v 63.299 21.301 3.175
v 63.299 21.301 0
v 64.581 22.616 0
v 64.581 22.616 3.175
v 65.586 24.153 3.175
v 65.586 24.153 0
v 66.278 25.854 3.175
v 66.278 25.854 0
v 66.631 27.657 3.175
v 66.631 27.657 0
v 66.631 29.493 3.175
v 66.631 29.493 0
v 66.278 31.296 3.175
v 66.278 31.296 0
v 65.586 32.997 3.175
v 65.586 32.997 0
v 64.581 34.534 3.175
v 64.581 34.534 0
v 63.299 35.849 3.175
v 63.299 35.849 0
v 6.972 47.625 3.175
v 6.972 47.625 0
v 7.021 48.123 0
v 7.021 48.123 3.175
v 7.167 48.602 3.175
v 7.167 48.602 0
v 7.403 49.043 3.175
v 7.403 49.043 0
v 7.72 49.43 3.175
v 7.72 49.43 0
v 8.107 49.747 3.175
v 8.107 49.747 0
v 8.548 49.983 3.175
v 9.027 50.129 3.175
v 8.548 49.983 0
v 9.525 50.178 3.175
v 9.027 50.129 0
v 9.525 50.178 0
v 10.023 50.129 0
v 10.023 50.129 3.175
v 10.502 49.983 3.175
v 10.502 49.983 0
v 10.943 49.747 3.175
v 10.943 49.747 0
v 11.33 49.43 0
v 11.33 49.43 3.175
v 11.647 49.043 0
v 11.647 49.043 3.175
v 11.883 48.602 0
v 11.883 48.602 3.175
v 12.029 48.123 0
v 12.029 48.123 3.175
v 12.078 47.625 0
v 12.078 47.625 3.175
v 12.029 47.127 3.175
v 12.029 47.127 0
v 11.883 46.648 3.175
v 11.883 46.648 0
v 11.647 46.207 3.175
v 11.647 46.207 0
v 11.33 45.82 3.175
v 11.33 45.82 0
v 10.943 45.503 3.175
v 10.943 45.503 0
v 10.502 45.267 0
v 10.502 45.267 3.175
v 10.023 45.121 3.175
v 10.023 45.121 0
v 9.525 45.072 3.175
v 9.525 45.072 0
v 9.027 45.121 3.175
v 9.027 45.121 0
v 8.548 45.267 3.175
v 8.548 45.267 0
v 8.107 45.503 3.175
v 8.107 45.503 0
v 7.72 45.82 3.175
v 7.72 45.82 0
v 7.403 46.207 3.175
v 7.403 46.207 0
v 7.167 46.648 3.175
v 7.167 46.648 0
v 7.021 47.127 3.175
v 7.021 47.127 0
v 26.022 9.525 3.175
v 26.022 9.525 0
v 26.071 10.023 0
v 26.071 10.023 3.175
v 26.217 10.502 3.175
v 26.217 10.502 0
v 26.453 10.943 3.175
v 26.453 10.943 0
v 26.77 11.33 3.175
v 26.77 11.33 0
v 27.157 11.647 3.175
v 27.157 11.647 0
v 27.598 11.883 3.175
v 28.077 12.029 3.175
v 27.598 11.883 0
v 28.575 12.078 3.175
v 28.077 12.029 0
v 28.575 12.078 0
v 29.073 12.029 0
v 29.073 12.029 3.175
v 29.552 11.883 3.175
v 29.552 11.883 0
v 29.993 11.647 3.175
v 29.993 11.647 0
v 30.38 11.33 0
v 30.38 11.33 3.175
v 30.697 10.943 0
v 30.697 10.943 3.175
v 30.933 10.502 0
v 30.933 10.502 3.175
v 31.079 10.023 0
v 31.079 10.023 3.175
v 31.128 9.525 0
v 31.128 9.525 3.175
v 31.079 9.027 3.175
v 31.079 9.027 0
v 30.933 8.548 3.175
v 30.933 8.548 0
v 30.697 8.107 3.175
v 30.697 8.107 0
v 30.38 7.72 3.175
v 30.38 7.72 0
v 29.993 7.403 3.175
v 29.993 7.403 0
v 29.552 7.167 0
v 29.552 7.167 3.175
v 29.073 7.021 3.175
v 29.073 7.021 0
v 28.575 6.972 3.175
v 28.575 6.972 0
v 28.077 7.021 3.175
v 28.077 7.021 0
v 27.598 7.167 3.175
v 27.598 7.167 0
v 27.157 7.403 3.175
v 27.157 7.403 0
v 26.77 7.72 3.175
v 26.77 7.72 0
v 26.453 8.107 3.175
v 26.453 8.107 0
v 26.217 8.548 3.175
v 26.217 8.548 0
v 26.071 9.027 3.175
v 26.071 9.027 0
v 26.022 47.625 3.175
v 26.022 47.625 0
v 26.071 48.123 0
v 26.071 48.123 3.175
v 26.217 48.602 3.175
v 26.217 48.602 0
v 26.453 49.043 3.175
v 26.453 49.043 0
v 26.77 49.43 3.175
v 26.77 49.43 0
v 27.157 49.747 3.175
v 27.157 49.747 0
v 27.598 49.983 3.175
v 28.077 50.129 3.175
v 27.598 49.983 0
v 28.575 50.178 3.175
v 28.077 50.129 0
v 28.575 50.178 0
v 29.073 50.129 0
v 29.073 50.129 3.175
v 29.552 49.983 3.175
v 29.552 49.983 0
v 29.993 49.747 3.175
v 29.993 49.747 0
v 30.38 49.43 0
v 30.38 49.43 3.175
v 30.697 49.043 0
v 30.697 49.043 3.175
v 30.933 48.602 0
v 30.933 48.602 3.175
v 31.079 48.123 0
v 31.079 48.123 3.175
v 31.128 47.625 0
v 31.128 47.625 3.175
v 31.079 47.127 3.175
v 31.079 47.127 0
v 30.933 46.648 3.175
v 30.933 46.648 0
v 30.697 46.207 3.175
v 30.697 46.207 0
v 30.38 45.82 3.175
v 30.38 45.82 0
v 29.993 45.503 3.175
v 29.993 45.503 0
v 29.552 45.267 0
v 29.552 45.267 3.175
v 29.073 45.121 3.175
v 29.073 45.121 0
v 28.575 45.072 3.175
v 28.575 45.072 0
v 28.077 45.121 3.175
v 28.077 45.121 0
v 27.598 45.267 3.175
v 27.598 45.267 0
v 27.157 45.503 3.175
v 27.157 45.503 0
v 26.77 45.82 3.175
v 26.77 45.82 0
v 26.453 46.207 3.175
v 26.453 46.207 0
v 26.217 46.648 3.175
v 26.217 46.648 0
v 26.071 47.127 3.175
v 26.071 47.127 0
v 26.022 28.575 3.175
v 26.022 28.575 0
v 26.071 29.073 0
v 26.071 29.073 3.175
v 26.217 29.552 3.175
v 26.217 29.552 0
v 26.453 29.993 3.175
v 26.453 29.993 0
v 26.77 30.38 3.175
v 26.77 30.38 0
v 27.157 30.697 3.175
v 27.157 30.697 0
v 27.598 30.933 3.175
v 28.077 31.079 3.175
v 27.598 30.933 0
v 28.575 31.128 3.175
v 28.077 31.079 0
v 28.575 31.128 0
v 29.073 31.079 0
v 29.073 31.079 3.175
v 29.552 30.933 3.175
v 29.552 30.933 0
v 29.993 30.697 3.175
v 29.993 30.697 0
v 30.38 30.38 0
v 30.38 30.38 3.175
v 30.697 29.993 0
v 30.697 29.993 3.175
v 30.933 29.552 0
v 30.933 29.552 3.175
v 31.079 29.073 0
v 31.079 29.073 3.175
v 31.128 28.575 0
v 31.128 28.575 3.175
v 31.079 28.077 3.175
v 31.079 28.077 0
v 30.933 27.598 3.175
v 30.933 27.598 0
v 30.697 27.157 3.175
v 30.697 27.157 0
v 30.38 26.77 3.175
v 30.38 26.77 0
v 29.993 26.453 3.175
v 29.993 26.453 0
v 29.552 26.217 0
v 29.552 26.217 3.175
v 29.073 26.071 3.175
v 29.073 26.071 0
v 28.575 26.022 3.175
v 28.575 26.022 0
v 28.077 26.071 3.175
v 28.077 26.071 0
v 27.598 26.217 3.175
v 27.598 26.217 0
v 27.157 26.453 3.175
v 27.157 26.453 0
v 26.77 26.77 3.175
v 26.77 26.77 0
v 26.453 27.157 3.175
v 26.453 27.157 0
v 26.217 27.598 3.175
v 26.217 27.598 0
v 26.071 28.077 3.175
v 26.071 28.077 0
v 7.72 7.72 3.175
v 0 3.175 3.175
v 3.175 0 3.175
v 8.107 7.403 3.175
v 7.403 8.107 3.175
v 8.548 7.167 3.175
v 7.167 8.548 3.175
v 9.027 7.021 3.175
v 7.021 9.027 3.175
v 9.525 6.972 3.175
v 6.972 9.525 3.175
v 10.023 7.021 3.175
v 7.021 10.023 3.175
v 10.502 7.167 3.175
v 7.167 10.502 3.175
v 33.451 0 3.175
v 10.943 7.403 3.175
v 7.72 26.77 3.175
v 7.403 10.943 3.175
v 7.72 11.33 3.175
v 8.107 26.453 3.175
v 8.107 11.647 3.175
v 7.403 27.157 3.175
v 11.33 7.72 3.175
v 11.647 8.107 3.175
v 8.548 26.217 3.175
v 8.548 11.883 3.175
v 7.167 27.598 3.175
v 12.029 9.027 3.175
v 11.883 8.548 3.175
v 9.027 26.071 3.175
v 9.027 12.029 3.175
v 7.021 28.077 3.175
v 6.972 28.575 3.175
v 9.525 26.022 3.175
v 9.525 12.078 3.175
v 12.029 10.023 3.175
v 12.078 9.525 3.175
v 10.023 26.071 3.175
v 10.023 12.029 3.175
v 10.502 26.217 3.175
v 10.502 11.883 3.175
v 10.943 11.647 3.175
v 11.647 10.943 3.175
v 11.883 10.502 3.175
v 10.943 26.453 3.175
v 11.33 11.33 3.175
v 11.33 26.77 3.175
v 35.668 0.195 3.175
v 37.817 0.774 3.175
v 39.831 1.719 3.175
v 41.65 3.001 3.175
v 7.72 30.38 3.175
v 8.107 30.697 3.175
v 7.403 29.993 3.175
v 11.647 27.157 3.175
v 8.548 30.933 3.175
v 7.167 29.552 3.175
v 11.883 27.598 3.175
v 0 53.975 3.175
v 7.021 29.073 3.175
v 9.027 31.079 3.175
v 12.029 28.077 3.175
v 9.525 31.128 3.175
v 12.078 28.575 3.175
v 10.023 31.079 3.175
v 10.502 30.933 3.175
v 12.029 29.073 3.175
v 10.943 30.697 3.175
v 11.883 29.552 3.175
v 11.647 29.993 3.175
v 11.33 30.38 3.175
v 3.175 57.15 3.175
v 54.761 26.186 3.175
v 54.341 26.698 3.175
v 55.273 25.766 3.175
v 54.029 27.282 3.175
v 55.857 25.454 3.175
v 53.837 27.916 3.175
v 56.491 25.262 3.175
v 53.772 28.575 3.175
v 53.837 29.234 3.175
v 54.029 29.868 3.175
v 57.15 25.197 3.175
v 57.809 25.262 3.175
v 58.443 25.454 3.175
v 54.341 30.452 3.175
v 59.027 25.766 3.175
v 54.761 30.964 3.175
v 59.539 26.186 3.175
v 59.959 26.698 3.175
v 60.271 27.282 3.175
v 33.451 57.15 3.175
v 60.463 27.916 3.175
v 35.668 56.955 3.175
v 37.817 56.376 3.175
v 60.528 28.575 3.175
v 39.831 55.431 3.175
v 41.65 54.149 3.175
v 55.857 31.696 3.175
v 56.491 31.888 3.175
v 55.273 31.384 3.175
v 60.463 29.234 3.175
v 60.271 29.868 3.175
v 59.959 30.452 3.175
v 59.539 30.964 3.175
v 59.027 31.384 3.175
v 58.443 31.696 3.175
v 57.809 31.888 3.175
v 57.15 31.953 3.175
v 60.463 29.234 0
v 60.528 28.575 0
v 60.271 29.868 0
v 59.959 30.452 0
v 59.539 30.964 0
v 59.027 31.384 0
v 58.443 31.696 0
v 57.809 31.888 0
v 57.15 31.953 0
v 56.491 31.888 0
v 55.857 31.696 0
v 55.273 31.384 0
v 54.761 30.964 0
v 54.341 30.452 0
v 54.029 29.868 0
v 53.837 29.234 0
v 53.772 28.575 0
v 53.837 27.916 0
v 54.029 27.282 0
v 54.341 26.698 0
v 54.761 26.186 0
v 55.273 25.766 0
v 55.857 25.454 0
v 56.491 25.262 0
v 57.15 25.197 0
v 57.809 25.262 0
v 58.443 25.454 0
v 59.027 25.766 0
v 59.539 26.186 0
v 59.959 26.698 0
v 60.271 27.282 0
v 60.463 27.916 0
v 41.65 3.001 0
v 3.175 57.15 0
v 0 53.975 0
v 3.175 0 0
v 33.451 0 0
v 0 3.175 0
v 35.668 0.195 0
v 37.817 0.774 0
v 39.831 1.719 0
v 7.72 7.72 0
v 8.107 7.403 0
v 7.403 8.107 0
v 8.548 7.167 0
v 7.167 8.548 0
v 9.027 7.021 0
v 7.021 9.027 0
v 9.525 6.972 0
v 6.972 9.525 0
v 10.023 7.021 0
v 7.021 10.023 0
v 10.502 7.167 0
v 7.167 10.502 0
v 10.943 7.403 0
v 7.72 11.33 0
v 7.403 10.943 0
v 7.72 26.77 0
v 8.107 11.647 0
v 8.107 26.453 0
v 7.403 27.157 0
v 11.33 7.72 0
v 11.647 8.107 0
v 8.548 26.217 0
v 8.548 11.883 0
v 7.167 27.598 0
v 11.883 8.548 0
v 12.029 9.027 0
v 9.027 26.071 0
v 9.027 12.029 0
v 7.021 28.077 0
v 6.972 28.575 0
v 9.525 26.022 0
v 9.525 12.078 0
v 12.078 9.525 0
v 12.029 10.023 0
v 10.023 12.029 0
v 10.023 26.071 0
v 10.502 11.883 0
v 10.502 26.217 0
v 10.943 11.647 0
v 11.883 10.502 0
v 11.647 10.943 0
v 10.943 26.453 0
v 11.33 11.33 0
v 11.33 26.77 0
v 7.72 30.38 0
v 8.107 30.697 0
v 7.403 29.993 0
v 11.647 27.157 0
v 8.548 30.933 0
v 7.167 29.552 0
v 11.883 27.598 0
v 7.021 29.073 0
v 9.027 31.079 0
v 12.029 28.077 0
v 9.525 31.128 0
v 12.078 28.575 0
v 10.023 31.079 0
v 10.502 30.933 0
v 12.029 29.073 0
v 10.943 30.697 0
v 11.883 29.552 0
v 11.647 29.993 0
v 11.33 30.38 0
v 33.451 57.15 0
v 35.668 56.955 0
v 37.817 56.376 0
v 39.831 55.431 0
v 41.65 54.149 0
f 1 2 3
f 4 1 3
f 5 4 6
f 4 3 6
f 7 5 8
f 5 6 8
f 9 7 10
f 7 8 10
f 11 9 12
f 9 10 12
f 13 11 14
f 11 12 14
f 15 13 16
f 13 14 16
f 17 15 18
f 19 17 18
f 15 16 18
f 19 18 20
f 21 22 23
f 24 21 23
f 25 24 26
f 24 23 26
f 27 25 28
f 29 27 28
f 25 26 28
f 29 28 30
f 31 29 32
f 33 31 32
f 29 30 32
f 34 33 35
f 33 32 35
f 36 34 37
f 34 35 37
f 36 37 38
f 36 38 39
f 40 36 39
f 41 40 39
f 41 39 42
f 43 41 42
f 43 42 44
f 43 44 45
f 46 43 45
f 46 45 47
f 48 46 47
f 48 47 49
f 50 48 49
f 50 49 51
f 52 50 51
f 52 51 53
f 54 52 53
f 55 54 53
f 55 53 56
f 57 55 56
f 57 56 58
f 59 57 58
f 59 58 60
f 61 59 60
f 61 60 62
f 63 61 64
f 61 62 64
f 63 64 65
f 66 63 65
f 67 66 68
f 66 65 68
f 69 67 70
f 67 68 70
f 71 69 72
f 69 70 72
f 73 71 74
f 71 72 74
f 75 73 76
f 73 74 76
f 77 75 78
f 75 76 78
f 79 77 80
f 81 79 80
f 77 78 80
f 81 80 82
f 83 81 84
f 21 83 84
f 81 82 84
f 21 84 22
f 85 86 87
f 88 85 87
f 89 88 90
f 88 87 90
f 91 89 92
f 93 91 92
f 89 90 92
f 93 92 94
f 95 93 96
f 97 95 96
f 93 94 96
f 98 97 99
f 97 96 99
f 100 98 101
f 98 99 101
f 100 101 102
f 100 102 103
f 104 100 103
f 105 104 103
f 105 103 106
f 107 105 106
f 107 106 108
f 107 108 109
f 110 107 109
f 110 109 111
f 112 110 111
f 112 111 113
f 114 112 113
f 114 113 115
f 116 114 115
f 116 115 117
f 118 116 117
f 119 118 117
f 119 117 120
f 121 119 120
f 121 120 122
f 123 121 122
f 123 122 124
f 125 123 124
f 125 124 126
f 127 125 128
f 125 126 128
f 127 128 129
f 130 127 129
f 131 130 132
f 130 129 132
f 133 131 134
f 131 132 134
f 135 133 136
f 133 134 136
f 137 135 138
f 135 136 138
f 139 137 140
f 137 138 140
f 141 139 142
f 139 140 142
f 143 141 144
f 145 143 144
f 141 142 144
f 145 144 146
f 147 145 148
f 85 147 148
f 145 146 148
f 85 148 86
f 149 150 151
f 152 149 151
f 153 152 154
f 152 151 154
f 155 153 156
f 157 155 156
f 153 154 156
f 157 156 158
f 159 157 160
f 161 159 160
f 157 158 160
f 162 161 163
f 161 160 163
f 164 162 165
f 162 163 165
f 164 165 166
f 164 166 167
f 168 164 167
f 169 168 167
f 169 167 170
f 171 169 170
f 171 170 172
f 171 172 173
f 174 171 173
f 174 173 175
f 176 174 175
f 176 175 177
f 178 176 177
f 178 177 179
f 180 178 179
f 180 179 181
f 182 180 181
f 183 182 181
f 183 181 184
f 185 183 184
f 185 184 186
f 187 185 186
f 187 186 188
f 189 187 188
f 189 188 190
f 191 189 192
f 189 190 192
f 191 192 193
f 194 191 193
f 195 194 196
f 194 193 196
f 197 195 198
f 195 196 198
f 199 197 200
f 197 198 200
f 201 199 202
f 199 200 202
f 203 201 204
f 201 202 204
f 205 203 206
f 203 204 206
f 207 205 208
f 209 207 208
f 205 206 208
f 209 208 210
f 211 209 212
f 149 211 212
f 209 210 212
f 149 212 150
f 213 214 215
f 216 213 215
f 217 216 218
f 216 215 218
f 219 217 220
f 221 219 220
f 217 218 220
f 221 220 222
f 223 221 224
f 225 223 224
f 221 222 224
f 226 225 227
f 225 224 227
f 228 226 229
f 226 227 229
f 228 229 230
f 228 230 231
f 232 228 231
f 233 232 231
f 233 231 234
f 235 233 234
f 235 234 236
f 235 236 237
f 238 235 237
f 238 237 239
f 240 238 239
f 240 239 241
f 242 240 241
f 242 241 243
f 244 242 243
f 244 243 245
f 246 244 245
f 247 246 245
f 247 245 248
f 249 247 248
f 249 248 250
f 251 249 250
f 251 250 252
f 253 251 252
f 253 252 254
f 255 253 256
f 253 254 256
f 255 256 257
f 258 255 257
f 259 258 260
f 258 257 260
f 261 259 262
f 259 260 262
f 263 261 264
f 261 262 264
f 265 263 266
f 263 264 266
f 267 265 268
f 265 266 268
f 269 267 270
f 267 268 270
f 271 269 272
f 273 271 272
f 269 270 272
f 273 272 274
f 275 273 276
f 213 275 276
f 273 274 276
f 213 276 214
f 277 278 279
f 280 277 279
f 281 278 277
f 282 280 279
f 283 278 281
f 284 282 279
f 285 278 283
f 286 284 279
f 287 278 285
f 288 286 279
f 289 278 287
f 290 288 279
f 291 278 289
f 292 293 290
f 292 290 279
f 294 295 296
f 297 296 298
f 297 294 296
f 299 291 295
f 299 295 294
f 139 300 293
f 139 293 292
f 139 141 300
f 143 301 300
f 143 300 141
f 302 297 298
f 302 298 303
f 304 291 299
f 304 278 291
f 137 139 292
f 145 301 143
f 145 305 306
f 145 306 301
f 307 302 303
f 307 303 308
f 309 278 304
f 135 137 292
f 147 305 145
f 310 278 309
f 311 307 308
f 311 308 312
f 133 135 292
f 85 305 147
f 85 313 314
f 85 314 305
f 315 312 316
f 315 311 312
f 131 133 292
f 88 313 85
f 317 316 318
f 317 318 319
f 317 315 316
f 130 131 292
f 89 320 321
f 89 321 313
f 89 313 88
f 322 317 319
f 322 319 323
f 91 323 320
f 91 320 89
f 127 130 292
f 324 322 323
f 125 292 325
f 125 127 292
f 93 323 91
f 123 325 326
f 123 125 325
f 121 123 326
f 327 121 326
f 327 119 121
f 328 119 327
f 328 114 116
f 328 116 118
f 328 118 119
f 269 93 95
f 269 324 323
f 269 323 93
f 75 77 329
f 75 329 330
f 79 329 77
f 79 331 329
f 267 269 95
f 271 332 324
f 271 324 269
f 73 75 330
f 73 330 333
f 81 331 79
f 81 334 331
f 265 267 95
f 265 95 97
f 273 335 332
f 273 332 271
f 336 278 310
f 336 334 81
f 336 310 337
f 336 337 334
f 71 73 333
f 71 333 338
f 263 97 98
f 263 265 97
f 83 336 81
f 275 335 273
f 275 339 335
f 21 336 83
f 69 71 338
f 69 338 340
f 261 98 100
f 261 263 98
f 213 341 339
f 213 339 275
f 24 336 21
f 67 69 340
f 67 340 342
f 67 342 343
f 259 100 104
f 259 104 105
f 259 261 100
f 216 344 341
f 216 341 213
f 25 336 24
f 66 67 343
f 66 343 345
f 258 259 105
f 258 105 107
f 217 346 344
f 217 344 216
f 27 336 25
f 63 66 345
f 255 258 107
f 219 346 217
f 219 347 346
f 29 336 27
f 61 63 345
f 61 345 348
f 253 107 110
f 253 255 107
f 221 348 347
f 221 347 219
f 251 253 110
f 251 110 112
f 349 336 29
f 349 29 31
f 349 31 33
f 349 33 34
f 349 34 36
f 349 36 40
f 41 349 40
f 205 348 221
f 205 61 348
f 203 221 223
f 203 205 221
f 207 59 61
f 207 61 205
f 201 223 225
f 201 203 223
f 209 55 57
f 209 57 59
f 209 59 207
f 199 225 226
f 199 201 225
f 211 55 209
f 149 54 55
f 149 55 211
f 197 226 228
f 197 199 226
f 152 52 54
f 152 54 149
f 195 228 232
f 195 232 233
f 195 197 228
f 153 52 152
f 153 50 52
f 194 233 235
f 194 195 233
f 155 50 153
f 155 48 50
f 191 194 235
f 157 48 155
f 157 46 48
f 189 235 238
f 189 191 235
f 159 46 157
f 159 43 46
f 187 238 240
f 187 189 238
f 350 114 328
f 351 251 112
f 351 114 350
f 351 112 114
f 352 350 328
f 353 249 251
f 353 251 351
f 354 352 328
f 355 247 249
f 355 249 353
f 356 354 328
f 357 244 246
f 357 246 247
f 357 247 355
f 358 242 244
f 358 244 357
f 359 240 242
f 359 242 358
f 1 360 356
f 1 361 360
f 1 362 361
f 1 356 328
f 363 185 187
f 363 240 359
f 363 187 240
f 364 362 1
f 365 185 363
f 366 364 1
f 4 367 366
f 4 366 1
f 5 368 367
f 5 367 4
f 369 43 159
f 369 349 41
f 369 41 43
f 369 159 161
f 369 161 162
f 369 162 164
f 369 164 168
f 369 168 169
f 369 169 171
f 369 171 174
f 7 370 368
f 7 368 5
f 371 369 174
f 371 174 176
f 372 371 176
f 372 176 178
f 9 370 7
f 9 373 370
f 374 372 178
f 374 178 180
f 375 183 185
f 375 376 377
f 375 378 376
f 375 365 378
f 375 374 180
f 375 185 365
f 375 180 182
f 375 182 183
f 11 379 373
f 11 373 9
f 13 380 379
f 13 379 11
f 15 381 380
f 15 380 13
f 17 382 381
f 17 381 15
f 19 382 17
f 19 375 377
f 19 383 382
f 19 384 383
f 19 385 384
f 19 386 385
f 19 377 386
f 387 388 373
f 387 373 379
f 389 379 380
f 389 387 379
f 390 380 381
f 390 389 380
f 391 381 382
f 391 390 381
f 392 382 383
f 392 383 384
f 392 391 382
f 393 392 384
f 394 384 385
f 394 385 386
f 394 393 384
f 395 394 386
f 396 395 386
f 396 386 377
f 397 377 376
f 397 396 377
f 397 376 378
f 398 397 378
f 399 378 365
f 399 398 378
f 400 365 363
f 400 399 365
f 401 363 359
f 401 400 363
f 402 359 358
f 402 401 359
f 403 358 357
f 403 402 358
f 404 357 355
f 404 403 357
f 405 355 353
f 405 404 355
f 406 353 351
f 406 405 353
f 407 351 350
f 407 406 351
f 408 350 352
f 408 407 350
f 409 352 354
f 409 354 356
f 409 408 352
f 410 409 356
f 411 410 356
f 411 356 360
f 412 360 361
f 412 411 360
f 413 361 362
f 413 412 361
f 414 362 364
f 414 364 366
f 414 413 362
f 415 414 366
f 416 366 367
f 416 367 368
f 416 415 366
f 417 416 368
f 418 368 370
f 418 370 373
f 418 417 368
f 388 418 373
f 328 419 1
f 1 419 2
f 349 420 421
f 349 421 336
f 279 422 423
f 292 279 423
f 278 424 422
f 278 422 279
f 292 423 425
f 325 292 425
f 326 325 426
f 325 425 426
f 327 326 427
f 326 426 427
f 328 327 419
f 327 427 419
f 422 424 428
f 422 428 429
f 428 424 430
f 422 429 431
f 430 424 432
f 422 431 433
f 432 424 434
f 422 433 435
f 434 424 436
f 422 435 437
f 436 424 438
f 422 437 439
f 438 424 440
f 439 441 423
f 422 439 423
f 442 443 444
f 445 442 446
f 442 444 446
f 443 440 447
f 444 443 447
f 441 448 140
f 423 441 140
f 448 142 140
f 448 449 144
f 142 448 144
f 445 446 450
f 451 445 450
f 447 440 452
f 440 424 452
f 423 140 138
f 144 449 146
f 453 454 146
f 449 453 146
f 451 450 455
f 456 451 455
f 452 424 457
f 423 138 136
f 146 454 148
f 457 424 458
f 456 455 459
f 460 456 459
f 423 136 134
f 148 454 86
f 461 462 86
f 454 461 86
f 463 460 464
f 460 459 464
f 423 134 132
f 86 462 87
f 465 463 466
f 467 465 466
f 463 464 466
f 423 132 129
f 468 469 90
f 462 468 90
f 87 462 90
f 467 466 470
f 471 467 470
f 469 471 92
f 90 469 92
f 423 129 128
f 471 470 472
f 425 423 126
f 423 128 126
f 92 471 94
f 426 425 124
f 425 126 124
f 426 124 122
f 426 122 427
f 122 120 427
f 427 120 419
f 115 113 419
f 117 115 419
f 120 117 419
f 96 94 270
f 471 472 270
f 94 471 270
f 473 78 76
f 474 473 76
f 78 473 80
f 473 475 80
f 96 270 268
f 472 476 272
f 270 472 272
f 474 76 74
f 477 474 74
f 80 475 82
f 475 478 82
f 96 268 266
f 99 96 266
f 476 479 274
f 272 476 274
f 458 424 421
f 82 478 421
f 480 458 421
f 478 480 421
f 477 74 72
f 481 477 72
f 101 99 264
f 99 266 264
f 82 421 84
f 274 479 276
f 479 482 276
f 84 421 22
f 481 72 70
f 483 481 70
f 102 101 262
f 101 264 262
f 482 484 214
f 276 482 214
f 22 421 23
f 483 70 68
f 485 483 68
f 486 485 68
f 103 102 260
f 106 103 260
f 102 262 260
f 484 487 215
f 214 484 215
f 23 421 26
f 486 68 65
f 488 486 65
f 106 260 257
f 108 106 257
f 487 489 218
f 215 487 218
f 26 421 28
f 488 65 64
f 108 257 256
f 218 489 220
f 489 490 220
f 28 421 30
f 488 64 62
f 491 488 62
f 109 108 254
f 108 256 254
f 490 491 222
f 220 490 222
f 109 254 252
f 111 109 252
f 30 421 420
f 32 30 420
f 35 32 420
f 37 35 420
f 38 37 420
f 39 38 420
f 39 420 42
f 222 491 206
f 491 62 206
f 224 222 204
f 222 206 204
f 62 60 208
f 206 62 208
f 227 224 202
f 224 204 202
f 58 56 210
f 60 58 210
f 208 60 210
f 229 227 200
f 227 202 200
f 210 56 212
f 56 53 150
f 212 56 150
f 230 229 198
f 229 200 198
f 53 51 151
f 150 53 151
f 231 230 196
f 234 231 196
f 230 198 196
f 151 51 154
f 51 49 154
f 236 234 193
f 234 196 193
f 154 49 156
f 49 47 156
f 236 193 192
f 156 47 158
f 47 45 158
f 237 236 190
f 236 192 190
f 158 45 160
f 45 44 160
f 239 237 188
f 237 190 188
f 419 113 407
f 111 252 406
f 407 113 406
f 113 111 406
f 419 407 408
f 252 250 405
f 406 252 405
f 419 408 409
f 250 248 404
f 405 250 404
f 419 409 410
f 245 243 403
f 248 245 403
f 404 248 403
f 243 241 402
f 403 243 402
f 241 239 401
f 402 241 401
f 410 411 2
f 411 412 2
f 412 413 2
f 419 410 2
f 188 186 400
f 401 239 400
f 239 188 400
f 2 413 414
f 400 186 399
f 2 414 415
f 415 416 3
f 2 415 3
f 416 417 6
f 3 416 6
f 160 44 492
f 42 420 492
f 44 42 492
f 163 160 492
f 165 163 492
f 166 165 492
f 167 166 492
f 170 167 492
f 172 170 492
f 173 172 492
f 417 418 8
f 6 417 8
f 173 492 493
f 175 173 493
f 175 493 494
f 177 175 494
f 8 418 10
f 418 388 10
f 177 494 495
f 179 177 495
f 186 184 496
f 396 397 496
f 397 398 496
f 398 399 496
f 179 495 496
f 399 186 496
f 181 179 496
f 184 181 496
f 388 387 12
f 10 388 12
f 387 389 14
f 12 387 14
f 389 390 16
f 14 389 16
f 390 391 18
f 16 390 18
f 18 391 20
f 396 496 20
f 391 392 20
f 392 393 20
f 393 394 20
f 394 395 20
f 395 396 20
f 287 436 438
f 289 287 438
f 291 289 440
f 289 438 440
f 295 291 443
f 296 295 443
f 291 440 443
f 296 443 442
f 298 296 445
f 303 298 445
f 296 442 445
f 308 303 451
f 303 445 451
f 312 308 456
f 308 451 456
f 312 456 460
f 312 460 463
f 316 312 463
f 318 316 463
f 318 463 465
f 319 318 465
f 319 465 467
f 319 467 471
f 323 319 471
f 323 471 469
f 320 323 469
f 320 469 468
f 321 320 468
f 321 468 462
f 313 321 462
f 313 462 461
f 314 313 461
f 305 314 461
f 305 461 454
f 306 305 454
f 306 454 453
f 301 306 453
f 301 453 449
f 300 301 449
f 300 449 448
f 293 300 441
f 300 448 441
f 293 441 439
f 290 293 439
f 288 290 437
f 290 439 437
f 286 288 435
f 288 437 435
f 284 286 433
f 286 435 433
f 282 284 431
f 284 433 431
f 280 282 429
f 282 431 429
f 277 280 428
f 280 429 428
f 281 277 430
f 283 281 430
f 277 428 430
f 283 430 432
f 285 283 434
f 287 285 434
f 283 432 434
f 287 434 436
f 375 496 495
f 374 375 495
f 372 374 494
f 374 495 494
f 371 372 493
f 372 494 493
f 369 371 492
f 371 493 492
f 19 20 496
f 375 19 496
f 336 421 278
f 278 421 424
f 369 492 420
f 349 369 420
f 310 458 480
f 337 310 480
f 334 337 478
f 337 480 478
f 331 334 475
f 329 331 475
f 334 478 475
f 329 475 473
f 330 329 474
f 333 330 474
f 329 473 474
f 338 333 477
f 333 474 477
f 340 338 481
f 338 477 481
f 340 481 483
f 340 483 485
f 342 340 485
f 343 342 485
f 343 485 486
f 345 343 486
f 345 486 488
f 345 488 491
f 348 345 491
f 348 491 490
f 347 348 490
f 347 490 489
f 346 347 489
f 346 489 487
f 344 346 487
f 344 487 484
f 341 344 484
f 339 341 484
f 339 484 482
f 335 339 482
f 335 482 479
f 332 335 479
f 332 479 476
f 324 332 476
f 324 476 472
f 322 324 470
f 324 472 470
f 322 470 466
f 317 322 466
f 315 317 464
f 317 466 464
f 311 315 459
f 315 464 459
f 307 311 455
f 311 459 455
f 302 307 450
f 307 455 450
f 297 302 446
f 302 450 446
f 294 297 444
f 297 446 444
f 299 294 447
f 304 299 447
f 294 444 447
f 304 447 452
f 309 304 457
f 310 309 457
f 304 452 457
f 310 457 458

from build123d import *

# Parameters (mm, degrees)
SKETCH1_R              = 3.3782
BOSS_EXTRUDE1_DEPTH    = 3.175
F_10_CLEARANCE_HOLE1_D = 5.1054
CHAMFER1_SIZE          = 3.175


with BuildPart() as part:
    # Sketch1 → Boss-Extrude1 (new body)
    with BuildSketch(Plane.XY):
        with BuildLine():
            Line((0, 0), (33.451477372, 0))
            ThreePointArc((33.451477372, 0), (37.816769242, 0.77380082), (41.650113644, 3.000909152))
            Line((41.650113644, 3.000909152), (63.298977204, 21.300681864))
            ThreePointArc((63.298977204, 21.300681864), (66.675, 28.575), (63.298977204, 35.849318136))
            Line((63.298977204, 35.849318136), (41.650113644, 54.149090848))
            ThreePointArc((41.650113644, 54.149090848), (37.816769242, 56.37619918), (33.451477372, 57.15))
            Line((33.451477372, 57.15), (0, 57.15))
            Line((0, 57.15), (0, 0))
        make_face()
        with Locations((57.15, 28.575)):
            Circle(SKETCH1_R, mode=Mode.SUBTRACT)
    extrude(amount=BOSS_EXTRUDE1_DEPTH)

    # #10 Clearance Hole1 (through all)
    with Locations(Plane.XY.offset(3.175)):
        with Locations((28.575, 28.575), (9.525, 28.575), (9.525, 47.625), (28.575, 47.625), (28.575, 9.525), (9.525, 9.525)):
            Hole(F_10_CLEARANCE_HOLE1_D / 2)

    # Chamfer1
    chamfer1_edges = [part.edges().sort_by_distance(p)[0] for p in [
        (0, 57.15, 1.5875),
        (0, 0, 1.5875),
    ]]
    chamfer(chamfer1_edges, length=CHAMFER1_SIZE)


solid = part.part
